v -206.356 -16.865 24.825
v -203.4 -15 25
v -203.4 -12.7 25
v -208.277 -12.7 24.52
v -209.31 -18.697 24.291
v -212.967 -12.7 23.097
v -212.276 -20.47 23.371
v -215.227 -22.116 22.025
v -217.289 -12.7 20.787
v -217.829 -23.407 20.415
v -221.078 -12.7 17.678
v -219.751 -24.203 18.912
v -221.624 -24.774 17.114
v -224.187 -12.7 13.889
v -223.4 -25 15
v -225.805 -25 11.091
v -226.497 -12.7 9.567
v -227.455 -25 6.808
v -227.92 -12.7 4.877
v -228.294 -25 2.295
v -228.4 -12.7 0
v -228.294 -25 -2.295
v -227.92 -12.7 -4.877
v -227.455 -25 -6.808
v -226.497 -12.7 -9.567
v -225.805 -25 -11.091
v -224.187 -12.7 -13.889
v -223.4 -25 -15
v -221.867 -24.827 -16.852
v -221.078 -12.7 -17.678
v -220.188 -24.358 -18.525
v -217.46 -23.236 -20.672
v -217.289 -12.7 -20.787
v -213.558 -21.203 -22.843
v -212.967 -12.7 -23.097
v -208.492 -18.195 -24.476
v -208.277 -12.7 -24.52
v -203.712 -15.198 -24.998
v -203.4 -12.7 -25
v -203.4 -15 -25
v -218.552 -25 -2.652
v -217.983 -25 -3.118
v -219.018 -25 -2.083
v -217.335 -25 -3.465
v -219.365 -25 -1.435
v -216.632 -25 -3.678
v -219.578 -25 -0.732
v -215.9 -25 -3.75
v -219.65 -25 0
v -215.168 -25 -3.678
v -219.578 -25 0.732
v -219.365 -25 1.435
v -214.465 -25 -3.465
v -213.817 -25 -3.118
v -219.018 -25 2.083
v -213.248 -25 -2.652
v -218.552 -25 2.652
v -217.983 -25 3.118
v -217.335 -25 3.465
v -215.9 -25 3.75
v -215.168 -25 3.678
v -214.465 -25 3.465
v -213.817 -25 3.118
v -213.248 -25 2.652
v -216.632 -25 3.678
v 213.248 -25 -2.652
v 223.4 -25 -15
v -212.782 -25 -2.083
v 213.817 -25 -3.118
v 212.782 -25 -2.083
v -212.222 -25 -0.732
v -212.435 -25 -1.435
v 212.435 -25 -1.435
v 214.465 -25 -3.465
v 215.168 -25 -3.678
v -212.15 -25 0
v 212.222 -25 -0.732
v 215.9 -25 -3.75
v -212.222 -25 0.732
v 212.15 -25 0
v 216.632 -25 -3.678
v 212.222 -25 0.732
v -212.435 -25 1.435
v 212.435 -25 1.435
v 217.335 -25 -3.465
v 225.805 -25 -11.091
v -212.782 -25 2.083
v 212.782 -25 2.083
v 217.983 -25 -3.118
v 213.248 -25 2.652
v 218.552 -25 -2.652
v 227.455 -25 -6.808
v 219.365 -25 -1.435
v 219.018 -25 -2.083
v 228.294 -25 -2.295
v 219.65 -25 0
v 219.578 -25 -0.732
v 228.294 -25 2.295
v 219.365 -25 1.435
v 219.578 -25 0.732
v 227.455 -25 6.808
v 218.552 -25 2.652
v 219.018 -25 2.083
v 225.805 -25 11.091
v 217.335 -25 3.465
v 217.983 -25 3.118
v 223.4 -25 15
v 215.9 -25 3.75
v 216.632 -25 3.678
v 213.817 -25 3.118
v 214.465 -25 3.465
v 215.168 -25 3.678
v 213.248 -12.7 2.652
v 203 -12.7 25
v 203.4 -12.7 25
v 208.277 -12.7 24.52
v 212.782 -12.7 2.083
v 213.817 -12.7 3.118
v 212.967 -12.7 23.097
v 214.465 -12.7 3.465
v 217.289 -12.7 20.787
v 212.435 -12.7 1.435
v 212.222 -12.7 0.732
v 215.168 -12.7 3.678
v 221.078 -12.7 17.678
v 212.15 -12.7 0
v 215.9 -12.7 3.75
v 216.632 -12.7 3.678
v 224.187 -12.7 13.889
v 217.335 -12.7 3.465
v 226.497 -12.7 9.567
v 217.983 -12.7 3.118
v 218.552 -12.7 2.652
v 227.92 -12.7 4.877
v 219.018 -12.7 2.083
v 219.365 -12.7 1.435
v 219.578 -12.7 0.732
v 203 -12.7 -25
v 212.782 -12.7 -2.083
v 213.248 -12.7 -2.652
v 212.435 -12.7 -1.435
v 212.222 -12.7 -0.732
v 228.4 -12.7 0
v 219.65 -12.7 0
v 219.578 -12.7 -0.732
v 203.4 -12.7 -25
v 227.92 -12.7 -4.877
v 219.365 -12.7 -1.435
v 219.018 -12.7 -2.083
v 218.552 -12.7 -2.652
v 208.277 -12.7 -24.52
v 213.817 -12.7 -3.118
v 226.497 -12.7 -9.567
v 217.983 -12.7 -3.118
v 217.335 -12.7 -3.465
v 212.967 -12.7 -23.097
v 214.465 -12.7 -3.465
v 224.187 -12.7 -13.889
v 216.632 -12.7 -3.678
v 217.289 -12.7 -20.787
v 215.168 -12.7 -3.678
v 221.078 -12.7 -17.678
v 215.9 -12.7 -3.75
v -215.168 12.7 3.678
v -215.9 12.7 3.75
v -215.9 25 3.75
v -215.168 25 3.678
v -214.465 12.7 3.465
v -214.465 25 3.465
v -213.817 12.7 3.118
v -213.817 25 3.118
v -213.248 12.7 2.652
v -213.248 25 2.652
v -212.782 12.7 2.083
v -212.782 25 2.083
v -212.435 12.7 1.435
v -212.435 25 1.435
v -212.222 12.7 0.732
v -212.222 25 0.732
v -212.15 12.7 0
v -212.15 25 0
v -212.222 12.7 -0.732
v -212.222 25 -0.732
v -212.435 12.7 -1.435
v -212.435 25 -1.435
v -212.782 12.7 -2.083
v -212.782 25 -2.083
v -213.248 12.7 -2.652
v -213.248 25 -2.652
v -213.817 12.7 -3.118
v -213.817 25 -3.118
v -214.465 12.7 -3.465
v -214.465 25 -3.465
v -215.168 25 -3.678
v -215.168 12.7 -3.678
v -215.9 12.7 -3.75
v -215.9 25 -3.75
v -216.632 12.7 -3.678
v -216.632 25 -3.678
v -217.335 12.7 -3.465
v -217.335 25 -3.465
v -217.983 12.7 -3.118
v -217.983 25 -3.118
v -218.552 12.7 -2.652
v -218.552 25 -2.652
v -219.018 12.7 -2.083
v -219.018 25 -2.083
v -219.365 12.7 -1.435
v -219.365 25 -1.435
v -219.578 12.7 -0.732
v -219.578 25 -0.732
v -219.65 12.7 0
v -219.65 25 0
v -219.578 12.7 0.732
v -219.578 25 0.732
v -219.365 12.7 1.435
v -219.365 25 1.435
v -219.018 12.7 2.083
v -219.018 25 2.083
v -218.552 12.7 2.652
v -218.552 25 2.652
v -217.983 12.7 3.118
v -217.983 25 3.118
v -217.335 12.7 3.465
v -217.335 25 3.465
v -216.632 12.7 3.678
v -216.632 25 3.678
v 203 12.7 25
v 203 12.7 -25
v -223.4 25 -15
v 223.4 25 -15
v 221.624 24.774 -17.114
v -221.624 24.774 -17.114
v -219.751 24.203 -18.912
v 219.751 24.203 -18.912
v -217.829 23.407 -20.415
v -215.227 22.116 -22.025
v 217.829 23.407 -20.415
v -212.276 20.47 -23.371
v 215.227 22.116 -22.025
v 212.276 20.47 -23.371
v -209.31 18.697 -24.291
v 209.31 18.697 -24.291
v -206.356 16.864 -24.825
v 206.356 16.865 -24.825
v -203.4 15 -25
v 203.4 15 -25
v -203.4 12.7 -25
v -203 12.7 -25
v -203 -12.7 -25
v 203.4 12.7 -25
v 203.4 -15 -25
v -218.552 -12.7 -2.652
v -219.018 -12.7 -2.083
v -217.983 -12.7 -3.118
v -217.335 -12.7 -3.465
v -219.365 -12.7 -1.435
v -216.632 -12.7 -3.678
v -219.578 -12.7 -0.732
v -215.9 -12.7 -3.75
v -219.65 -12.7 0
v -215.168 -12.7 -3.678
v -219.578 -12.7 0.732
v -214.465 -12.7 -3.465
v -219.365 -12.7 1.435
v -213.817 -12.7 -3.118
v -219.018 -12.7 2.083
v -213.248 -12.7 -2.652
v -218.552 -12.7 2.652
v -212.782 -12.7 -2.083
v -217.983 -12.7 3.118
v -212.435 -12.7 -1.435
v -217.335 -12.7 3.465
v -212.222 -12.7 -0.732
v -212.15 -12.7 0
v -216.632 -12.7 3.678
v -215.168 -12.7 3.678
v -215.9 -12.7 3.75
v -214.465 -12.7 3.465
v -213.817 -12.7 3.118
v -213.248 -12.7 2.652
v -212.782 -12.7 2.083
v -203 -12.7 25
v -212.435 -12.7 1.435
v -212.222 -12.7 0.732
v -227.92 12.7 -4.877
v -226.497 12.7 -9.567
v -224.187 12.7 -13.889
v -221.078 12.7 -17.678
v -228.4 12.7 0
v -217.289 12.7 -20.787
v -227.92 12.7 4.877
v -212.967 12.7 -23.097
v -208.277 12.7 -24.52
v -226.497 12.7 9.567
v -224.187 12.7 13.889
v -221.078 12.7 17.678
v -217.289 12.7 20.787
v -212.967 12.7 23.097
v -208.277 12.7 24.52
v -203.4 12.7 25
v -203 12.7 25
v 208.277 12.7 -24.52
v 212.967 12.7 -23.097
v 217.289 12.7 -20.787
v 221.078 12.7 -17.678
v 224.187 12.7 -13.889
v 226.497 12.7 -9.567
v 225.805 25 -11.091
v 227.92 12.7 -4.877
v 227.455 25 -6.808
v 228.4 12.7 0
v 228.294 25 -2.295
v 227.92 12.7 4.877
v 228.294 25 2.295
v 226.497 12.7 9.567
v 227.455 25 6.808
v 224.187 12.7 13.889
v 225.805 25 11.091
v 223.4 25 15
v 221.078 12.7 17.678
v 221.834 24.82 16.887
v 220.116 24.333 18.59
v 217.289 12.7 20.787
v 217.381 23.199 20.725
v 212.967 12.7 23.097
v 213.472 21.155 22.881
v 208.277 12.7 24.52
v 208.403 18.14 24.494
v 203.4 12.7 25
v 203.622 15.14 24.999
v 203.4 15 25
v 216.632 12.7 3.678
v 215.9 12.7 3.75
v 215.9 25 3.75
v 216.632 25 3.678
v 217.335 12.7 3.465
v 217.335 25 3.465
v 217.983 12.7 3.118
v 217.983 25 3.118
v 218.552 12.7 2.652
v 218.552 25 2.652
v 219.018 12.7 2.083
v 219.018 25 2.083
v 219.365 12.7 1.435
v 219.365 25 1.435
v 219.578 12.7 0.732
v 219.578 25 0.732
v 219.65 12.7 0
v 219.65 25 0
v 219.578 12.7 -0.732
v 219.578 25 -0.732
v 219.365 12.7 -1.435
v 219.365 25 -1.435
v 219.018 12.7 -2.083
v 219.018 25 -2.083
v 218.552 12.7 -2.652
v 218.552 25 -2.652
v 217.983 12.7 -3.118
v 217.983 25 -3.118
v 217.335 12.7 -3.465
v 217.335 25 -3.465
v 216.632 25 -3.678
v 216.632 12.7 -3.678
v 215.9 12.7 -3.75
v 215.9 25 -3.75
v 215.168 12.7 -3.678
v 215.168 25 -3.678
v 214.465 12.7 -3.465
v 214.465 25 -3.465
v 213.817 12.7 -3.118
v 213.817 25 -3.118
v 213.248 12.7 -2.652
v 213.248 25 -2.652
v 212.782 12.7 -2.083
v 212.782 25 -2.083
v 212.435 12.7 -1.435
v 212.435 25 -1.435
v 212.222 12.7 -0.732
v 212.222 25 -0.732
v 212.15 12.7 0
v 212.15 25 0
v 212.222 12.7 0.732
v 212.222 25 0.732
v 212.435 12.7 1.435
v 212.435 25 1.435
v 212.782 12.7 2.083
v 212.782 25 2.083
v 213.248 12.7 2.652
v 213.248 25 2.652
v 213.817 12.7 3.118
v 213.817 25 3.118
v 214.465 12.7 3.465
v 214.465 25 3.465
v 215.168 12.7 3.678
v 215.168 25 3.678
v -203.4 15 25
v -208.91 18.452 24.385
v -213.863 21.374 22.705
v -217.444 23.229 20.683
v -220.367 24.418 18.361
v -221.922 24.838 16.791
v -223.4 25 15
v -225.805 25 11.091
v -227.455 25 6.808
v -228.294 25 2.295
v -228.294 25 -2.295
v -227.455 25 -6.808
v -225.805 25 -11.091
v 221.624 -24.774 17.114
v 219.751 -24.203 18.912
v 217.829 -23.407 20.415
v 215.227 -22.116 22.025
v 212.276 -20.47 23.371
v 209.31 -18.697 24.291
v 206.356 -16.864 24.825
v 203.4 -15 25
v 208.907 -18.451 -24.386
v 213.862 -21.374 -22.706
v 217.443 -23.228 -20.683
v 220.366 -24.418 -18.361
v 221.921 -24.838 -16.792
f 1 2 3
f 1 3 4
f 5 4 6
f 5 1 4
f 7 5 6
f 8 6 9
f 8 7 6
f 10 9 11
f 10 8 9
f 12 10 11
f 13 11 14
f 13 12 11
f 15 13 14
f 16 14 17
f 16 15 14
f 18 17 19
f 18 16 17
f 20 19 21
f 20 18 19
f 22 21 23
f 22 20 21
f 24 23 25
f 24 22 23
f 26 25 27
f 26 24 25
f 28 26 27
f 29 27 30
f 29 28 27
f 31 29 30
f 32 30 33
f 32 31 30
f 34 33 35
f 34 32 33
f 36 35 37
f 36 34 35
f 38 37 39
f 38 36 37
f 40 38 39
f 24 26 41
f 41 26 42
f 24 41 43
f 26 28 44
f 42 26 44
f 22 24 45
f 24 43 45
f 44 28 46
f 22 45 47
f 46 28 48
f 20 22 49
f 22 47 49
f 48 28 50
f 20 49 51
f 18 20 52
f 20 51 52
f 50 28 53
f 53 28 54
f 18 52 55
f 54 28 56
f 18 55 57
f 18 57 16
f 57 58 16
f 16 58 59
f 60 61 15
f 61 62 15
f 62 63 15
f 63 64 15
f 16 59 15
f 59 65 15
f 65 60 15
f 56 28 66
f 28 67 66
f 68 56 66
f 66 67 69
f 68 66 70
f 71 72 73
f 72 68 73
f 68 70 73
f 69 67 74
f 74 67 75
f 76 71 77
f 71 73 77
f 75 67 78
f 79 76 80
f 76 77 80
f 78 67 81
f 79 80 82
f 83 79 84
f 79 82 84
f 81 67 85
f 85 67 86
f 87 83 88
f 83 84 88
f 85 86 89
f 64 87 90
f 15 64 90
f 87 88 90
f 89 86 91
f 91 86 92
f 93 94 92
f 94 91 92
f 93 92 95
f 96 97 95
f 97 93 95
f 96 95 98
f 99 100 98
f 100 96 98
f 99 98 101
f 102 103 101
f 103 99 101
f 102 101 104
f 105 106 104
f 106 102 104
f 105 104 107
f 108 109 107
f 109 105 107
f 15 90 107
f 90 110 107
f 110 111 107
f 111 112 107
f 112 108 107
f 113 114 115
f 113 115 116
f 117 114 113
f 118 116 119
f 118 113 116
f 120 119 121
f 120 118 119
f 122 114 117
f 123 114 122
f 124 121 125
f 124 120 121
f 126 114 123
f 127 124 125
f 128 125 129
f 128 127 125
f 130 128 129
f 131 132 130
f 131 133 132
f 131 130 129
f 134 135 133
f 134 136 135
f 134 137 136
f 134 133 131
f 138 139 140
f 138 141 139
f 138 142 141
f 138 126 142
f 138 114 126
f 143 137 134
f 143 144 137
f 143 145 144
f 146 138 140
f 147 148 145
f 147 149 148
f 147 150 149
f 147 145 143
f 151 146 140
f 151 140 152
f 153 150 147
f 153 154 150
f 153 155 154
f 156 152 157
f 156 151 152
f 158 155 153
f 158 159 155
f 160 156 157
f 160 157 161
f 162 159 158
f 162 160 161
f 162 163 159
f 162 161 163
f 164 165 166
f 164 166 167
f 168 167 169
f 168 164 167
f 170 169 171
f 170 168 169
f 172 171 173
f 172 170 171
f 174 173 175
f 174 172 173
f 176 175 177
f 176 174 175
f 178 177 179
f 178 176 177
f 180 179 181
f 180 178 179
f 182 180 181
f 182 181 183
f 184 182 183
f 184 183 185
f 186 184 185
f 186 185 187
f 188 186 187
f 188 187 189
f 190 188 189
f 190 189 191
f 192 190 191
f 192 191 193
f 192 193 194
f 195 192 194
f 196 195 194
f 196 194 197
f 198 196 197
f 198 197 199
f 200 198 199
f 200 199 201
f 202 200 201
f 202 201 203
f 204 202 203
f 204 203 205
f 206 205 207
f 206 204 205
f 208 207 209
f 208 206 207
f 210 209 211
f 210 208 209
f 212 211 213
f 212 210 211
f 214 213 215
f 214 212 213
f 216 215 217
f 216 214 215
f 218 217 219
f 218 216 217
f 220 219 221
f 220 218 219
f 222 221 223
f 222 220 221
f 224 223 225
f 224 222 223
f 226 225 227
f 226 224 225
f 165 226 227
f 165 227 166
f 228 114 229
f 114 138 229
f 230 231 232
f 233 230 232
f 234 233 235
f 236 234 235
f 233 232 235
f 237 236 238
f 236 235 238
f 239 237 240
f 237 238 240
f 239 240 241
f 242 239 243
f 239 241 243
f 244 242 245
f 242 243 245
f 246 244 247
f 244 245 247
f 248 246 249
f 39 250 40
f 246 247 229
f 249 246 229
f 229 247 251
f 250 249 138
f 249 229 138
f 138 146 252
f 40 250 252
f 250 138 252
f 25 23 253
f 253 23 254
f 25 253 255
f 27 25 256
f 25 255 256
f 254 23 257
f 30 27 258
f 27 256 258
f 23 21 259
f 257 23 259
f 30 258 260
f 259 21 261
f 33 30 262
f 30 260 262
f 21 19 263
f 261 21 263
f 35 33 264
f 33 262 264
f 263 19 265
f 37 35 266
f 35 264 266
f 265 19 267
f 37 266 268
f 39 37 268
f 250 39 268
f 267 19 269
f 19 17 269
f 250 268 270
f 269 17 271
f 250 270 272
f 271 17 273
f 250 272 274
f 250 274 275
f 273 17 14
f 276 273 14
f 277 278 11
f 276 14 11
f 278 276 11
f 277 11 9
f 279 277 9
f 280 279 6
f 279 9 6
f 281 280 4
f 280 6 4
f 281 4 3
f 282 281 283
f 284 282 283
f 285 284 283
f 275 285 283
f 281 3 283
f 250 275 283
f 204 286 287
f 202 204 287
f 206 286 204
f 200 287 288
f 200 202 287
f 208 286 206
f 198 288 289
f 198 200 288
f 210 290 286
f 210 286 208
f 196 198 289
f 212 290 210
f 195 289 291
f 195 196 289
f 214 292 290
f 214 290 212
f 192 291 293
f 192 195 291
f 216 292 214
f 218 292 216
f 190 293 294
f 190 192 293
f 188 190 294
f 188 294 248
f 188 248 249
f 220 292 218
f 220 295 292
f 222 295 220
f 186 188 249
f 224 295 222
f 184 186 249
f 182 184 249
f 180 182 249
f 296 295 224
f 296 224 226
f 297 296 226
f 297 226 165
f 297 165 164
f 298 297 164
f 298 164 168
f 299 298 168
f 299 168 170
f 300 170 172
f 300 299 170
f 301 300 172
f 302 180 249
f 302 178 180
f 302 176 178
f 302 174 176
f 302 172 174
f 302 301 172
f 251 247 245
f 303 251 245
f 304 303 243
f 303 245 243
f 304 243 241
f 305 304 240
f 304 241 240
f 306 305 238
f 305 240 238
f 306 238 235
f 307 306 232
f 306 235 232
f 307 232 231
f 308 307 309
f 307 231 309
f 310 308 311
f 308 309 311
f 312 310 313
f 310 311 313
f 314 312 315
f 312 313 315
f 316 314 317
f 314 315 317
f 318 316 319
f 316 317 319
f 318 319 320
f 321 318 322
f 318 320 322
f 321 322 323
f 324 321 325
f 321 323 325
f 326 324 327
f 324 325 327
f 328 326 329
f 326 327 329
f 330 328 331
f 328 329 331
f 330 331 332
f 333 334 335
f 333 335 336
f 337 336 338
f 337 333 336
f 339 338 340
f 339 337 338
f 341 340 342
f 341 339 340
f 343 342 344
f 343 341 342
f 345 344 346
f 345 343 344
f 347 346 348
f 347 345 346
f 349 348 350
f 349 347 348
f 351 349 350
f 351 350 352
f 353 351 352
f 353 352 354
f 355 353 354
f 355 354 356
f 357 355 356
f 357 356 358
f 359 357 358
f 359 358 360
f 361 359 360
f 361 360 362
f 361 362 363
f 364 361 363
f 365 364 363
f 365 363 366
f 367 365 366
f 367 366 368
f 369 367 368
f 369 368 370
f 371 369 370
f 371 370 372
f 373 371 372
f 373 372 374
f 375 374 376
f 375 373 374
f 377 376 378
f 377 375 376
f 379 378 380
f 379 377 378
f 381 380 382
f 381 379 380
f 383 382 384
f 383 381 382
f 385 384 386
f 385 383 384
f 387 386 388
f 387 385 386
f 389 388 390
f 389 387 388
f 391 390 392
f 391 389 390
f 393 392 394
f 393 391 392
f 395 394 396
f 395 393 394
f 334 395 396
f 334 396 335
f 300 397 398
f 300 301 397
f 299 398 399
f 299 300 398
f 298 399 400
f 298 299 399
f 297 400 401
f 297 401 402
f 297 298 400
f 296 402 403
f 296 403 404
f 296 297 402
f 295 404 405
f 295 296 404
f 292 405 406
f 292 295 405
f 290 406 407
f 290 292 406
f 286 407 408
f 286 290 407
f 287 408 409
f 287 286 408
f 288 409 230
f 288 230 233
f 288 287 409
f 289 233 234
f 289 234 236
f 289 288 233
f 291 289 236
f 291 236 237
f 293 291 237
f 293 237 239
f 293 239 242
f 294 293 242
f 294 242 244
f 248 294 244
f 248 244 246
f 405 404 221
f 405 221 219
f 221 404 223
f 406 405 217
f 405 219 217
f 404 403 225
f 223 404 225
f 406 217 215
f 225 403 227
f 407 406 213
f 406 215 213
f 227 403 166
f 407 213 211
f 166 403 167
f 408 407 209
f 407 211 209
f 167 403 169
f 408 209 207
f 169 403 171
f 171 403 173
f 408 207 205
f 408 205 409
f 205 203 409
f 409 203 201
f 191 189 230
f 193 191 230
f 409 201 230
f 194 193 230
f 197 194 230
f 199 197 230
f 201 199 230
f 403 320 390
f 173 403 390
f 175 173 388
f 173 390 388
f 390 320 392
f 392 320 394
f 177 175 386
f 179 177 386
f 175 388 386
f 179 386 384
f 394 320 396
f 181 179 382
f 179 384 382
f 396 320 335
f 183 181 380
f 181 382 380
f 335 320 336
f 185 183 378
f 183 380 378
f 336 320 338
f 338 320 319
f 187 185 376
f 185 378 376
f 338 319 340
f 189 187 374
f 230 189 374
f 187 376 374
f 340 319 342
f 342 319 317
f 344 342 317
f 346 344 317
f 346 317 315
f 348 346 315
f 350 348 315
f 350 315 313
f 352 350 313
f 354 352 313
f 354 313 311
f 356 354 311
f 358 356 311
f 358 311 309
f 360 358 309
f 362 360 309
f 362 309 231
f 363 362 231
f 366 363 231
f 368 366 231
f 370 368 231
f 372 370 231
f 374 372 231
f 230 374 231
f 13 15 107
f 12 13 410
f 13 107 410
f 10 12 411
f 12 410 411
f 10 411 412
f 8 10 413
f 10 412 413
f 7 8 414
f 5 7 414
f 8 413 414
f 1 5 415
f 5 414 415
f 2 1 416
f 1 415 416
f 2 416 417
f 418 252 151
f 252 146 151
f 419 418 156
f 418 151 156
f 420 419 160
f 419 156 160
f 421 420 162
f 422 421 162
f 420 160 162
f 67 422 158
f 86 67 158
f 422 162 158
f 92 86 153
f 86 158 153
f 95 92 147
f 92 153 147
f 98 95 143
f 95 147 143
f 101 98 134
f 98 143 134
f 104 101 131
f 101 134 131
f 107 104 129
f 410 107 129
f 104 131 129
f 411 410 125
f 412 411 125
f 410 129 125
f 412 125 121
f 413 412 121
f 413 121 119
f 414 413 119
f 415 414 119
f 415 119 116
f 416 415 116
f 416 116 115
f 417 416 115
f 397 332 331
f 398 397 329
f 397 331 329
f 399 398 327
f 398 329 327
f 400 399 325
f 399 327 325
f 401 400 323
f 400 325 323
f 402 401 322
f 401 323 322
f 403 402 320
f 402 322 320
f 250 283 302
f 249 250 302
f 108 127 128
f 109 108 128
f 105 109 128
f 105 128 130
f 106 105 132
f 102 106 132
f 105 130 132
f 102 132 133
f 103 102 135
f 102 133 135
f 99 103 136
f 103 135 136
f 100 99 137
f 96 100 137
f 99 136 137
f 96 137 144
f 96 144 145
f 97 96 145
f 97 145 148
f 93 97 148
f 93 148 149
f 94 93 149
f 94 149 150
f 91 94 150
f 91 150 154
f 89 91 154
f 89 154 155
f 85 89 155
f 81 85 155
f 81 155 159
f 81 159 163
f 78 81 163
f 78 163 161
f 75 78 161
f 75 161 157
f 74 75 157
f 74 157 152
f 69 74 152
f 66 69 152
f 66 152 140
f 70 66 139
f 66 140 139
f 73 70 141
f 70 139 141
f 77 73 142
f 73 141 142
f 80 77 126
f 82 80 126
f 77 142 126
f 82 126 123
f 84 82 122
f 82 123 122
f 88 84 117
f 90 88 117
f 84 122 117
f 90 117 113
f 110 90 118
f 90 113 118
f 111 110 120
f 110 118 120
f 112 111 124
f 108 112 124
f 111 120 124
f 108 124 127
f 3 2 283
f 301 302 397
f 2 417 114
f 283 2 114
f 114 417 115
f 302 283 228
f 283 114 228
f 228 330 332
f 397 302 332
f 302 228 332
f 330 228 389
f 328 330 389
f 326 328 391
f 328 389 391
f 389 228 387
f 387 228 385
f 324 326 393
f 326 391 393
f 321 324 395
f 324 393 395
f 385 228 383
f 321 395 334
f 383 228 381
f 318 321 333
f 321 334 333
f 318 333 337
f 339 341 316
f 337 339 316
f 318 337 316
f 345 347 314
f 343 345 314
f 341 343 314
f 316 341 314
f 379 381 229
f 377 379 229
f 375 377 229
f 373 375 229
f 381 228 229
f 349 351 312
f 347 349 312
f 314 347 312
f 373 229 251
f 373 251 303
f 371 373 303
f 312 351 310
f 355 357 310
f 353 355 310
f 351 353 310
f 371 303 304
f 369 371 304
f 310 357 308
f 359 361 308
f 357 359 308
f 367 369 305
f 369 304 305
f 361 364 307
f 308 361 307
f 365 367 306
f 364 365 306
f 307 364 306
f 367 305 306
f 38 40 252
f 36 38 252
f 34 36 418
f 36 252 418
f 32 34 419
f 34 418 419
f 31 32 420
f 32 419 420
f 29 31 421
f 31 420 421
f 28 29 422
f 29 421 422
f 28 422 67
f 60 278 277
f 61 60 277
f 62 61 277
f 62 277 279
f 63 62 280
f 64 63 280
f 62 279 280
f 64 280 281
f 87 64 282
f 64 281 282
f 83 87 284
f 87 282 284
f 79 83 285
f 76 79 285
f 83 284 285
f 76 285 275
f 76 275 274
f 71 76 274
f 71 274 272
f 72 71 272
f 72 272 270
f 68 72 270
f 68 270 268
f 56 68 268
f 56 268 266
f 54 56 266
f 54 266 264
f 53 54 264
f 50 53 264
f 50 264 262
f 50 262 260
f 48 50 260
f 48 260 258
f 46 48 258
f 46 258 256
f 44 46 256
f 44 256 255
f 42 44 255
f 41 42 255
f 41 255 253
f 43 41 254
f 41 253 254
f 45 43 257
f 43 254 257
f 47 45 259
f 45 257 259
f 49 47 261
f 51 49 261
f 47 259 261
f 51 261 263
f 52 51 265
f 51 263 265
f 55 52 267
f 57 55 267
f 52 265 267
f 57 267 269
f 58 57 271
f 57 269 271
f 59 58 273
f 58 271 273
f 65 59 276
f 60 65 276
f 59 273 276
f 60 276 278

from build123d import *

# Parameters (mm, degrees)
BOSS_EXTRUDE1_DEPTH = 228.4
SKETCH2_W           = 25.4
SKETCH2_H           = 25.4
CUT_EXTRUDE1_DEPTH  = 25
SKETCH4_R           = 3.75
CUT_EXTRUDE6_DEPTH  = 25


with BuildPart() as part:
    # Sketch1 → Boss-Extrude1 (new, symmetric)
    with BuildSketch(Plane(origin=(0, 0, 0), x_dir=(0, 0, -1), z_dir=(1, 0, 0))):
        with BuildLine():
            Line((-15, 25), (15, 25))
            ThreePointArc((15, 25), (22.071067812, 22.071067812), (25, 15))
            Line((25, 15), (25, -15))
            ThreePointArc((25, -15), (22.071067812, -22.071067812), (15, -25))
            Line((15, -25), (-15, -25))
            ThreePointArc((-15, -25), (-22.071067812, -22.071067812), (-25, -15))
            Line((-25, -15), (-25, 15))
            ThreePointArc((-25, 15), (-22.071067812, 22.071067812), (-15, 25))
        make_face()
    extrude(amount=BOSS_EXTRUDE1_DEPTH, both=True)

    # Sketch2 → Cut-Extrude1 (cut, symmetric)
    with BuildSketch(Plane.XY):
        with Locations((215.7, 0)):
            Rectangle(SKETCH2_W, SKETCH2_H)
        with Locations((-215.7, 0)):
            Rectangle(SKETCH2_W, SKETCH2_H)
    extrude(amount=CUT_EXTRUDE1_DEPTH, both=True, mode=Mode.SUBTRACT)

    # Sketch4 → Cut-Extrude6 (cut, symmetric)
    with BuildSketch(Plane(origin=(0, 0, 0), x_dir=(1, 0, 0), z_dir=(0, 1, 0))):
        with Locations(Location((-215.9, 0, 0), (0, 0, 270))):
            Circle(SKETCH4_R)
        with Locations(Location((215.9, 0, 0), (0, 0, 270))):
            Circle(SKETCH4_R)
        with BuildLine():
            Line((-203.4, 25), (-203.4, 45))
            ThreePointArc((-203.4, 45), (-248.4, 0), (-203.4, -45))
            Line((-203.4, -45), (-203.4, -25))
            ThreePointArc((-203.4, -25), (-228.4, 0), (-203.4, 25))
        make_face()
        with BuildLine():
            Line((203.4, 45), (203.4, 25))
            ThreePointArc((203.4, 25), (228.4, 0), (203.4, -25))
            Line((203.4, -25), (203.4, -45))
            ThreePointArc((203.4, -45), (248.4, 0), (203.4, 45))
        make_face()
    extrude(amount=CUT_EXTRUDE6_DEPTH, both=True, mode=Mode.SUBTRACT)


solid = part.part
